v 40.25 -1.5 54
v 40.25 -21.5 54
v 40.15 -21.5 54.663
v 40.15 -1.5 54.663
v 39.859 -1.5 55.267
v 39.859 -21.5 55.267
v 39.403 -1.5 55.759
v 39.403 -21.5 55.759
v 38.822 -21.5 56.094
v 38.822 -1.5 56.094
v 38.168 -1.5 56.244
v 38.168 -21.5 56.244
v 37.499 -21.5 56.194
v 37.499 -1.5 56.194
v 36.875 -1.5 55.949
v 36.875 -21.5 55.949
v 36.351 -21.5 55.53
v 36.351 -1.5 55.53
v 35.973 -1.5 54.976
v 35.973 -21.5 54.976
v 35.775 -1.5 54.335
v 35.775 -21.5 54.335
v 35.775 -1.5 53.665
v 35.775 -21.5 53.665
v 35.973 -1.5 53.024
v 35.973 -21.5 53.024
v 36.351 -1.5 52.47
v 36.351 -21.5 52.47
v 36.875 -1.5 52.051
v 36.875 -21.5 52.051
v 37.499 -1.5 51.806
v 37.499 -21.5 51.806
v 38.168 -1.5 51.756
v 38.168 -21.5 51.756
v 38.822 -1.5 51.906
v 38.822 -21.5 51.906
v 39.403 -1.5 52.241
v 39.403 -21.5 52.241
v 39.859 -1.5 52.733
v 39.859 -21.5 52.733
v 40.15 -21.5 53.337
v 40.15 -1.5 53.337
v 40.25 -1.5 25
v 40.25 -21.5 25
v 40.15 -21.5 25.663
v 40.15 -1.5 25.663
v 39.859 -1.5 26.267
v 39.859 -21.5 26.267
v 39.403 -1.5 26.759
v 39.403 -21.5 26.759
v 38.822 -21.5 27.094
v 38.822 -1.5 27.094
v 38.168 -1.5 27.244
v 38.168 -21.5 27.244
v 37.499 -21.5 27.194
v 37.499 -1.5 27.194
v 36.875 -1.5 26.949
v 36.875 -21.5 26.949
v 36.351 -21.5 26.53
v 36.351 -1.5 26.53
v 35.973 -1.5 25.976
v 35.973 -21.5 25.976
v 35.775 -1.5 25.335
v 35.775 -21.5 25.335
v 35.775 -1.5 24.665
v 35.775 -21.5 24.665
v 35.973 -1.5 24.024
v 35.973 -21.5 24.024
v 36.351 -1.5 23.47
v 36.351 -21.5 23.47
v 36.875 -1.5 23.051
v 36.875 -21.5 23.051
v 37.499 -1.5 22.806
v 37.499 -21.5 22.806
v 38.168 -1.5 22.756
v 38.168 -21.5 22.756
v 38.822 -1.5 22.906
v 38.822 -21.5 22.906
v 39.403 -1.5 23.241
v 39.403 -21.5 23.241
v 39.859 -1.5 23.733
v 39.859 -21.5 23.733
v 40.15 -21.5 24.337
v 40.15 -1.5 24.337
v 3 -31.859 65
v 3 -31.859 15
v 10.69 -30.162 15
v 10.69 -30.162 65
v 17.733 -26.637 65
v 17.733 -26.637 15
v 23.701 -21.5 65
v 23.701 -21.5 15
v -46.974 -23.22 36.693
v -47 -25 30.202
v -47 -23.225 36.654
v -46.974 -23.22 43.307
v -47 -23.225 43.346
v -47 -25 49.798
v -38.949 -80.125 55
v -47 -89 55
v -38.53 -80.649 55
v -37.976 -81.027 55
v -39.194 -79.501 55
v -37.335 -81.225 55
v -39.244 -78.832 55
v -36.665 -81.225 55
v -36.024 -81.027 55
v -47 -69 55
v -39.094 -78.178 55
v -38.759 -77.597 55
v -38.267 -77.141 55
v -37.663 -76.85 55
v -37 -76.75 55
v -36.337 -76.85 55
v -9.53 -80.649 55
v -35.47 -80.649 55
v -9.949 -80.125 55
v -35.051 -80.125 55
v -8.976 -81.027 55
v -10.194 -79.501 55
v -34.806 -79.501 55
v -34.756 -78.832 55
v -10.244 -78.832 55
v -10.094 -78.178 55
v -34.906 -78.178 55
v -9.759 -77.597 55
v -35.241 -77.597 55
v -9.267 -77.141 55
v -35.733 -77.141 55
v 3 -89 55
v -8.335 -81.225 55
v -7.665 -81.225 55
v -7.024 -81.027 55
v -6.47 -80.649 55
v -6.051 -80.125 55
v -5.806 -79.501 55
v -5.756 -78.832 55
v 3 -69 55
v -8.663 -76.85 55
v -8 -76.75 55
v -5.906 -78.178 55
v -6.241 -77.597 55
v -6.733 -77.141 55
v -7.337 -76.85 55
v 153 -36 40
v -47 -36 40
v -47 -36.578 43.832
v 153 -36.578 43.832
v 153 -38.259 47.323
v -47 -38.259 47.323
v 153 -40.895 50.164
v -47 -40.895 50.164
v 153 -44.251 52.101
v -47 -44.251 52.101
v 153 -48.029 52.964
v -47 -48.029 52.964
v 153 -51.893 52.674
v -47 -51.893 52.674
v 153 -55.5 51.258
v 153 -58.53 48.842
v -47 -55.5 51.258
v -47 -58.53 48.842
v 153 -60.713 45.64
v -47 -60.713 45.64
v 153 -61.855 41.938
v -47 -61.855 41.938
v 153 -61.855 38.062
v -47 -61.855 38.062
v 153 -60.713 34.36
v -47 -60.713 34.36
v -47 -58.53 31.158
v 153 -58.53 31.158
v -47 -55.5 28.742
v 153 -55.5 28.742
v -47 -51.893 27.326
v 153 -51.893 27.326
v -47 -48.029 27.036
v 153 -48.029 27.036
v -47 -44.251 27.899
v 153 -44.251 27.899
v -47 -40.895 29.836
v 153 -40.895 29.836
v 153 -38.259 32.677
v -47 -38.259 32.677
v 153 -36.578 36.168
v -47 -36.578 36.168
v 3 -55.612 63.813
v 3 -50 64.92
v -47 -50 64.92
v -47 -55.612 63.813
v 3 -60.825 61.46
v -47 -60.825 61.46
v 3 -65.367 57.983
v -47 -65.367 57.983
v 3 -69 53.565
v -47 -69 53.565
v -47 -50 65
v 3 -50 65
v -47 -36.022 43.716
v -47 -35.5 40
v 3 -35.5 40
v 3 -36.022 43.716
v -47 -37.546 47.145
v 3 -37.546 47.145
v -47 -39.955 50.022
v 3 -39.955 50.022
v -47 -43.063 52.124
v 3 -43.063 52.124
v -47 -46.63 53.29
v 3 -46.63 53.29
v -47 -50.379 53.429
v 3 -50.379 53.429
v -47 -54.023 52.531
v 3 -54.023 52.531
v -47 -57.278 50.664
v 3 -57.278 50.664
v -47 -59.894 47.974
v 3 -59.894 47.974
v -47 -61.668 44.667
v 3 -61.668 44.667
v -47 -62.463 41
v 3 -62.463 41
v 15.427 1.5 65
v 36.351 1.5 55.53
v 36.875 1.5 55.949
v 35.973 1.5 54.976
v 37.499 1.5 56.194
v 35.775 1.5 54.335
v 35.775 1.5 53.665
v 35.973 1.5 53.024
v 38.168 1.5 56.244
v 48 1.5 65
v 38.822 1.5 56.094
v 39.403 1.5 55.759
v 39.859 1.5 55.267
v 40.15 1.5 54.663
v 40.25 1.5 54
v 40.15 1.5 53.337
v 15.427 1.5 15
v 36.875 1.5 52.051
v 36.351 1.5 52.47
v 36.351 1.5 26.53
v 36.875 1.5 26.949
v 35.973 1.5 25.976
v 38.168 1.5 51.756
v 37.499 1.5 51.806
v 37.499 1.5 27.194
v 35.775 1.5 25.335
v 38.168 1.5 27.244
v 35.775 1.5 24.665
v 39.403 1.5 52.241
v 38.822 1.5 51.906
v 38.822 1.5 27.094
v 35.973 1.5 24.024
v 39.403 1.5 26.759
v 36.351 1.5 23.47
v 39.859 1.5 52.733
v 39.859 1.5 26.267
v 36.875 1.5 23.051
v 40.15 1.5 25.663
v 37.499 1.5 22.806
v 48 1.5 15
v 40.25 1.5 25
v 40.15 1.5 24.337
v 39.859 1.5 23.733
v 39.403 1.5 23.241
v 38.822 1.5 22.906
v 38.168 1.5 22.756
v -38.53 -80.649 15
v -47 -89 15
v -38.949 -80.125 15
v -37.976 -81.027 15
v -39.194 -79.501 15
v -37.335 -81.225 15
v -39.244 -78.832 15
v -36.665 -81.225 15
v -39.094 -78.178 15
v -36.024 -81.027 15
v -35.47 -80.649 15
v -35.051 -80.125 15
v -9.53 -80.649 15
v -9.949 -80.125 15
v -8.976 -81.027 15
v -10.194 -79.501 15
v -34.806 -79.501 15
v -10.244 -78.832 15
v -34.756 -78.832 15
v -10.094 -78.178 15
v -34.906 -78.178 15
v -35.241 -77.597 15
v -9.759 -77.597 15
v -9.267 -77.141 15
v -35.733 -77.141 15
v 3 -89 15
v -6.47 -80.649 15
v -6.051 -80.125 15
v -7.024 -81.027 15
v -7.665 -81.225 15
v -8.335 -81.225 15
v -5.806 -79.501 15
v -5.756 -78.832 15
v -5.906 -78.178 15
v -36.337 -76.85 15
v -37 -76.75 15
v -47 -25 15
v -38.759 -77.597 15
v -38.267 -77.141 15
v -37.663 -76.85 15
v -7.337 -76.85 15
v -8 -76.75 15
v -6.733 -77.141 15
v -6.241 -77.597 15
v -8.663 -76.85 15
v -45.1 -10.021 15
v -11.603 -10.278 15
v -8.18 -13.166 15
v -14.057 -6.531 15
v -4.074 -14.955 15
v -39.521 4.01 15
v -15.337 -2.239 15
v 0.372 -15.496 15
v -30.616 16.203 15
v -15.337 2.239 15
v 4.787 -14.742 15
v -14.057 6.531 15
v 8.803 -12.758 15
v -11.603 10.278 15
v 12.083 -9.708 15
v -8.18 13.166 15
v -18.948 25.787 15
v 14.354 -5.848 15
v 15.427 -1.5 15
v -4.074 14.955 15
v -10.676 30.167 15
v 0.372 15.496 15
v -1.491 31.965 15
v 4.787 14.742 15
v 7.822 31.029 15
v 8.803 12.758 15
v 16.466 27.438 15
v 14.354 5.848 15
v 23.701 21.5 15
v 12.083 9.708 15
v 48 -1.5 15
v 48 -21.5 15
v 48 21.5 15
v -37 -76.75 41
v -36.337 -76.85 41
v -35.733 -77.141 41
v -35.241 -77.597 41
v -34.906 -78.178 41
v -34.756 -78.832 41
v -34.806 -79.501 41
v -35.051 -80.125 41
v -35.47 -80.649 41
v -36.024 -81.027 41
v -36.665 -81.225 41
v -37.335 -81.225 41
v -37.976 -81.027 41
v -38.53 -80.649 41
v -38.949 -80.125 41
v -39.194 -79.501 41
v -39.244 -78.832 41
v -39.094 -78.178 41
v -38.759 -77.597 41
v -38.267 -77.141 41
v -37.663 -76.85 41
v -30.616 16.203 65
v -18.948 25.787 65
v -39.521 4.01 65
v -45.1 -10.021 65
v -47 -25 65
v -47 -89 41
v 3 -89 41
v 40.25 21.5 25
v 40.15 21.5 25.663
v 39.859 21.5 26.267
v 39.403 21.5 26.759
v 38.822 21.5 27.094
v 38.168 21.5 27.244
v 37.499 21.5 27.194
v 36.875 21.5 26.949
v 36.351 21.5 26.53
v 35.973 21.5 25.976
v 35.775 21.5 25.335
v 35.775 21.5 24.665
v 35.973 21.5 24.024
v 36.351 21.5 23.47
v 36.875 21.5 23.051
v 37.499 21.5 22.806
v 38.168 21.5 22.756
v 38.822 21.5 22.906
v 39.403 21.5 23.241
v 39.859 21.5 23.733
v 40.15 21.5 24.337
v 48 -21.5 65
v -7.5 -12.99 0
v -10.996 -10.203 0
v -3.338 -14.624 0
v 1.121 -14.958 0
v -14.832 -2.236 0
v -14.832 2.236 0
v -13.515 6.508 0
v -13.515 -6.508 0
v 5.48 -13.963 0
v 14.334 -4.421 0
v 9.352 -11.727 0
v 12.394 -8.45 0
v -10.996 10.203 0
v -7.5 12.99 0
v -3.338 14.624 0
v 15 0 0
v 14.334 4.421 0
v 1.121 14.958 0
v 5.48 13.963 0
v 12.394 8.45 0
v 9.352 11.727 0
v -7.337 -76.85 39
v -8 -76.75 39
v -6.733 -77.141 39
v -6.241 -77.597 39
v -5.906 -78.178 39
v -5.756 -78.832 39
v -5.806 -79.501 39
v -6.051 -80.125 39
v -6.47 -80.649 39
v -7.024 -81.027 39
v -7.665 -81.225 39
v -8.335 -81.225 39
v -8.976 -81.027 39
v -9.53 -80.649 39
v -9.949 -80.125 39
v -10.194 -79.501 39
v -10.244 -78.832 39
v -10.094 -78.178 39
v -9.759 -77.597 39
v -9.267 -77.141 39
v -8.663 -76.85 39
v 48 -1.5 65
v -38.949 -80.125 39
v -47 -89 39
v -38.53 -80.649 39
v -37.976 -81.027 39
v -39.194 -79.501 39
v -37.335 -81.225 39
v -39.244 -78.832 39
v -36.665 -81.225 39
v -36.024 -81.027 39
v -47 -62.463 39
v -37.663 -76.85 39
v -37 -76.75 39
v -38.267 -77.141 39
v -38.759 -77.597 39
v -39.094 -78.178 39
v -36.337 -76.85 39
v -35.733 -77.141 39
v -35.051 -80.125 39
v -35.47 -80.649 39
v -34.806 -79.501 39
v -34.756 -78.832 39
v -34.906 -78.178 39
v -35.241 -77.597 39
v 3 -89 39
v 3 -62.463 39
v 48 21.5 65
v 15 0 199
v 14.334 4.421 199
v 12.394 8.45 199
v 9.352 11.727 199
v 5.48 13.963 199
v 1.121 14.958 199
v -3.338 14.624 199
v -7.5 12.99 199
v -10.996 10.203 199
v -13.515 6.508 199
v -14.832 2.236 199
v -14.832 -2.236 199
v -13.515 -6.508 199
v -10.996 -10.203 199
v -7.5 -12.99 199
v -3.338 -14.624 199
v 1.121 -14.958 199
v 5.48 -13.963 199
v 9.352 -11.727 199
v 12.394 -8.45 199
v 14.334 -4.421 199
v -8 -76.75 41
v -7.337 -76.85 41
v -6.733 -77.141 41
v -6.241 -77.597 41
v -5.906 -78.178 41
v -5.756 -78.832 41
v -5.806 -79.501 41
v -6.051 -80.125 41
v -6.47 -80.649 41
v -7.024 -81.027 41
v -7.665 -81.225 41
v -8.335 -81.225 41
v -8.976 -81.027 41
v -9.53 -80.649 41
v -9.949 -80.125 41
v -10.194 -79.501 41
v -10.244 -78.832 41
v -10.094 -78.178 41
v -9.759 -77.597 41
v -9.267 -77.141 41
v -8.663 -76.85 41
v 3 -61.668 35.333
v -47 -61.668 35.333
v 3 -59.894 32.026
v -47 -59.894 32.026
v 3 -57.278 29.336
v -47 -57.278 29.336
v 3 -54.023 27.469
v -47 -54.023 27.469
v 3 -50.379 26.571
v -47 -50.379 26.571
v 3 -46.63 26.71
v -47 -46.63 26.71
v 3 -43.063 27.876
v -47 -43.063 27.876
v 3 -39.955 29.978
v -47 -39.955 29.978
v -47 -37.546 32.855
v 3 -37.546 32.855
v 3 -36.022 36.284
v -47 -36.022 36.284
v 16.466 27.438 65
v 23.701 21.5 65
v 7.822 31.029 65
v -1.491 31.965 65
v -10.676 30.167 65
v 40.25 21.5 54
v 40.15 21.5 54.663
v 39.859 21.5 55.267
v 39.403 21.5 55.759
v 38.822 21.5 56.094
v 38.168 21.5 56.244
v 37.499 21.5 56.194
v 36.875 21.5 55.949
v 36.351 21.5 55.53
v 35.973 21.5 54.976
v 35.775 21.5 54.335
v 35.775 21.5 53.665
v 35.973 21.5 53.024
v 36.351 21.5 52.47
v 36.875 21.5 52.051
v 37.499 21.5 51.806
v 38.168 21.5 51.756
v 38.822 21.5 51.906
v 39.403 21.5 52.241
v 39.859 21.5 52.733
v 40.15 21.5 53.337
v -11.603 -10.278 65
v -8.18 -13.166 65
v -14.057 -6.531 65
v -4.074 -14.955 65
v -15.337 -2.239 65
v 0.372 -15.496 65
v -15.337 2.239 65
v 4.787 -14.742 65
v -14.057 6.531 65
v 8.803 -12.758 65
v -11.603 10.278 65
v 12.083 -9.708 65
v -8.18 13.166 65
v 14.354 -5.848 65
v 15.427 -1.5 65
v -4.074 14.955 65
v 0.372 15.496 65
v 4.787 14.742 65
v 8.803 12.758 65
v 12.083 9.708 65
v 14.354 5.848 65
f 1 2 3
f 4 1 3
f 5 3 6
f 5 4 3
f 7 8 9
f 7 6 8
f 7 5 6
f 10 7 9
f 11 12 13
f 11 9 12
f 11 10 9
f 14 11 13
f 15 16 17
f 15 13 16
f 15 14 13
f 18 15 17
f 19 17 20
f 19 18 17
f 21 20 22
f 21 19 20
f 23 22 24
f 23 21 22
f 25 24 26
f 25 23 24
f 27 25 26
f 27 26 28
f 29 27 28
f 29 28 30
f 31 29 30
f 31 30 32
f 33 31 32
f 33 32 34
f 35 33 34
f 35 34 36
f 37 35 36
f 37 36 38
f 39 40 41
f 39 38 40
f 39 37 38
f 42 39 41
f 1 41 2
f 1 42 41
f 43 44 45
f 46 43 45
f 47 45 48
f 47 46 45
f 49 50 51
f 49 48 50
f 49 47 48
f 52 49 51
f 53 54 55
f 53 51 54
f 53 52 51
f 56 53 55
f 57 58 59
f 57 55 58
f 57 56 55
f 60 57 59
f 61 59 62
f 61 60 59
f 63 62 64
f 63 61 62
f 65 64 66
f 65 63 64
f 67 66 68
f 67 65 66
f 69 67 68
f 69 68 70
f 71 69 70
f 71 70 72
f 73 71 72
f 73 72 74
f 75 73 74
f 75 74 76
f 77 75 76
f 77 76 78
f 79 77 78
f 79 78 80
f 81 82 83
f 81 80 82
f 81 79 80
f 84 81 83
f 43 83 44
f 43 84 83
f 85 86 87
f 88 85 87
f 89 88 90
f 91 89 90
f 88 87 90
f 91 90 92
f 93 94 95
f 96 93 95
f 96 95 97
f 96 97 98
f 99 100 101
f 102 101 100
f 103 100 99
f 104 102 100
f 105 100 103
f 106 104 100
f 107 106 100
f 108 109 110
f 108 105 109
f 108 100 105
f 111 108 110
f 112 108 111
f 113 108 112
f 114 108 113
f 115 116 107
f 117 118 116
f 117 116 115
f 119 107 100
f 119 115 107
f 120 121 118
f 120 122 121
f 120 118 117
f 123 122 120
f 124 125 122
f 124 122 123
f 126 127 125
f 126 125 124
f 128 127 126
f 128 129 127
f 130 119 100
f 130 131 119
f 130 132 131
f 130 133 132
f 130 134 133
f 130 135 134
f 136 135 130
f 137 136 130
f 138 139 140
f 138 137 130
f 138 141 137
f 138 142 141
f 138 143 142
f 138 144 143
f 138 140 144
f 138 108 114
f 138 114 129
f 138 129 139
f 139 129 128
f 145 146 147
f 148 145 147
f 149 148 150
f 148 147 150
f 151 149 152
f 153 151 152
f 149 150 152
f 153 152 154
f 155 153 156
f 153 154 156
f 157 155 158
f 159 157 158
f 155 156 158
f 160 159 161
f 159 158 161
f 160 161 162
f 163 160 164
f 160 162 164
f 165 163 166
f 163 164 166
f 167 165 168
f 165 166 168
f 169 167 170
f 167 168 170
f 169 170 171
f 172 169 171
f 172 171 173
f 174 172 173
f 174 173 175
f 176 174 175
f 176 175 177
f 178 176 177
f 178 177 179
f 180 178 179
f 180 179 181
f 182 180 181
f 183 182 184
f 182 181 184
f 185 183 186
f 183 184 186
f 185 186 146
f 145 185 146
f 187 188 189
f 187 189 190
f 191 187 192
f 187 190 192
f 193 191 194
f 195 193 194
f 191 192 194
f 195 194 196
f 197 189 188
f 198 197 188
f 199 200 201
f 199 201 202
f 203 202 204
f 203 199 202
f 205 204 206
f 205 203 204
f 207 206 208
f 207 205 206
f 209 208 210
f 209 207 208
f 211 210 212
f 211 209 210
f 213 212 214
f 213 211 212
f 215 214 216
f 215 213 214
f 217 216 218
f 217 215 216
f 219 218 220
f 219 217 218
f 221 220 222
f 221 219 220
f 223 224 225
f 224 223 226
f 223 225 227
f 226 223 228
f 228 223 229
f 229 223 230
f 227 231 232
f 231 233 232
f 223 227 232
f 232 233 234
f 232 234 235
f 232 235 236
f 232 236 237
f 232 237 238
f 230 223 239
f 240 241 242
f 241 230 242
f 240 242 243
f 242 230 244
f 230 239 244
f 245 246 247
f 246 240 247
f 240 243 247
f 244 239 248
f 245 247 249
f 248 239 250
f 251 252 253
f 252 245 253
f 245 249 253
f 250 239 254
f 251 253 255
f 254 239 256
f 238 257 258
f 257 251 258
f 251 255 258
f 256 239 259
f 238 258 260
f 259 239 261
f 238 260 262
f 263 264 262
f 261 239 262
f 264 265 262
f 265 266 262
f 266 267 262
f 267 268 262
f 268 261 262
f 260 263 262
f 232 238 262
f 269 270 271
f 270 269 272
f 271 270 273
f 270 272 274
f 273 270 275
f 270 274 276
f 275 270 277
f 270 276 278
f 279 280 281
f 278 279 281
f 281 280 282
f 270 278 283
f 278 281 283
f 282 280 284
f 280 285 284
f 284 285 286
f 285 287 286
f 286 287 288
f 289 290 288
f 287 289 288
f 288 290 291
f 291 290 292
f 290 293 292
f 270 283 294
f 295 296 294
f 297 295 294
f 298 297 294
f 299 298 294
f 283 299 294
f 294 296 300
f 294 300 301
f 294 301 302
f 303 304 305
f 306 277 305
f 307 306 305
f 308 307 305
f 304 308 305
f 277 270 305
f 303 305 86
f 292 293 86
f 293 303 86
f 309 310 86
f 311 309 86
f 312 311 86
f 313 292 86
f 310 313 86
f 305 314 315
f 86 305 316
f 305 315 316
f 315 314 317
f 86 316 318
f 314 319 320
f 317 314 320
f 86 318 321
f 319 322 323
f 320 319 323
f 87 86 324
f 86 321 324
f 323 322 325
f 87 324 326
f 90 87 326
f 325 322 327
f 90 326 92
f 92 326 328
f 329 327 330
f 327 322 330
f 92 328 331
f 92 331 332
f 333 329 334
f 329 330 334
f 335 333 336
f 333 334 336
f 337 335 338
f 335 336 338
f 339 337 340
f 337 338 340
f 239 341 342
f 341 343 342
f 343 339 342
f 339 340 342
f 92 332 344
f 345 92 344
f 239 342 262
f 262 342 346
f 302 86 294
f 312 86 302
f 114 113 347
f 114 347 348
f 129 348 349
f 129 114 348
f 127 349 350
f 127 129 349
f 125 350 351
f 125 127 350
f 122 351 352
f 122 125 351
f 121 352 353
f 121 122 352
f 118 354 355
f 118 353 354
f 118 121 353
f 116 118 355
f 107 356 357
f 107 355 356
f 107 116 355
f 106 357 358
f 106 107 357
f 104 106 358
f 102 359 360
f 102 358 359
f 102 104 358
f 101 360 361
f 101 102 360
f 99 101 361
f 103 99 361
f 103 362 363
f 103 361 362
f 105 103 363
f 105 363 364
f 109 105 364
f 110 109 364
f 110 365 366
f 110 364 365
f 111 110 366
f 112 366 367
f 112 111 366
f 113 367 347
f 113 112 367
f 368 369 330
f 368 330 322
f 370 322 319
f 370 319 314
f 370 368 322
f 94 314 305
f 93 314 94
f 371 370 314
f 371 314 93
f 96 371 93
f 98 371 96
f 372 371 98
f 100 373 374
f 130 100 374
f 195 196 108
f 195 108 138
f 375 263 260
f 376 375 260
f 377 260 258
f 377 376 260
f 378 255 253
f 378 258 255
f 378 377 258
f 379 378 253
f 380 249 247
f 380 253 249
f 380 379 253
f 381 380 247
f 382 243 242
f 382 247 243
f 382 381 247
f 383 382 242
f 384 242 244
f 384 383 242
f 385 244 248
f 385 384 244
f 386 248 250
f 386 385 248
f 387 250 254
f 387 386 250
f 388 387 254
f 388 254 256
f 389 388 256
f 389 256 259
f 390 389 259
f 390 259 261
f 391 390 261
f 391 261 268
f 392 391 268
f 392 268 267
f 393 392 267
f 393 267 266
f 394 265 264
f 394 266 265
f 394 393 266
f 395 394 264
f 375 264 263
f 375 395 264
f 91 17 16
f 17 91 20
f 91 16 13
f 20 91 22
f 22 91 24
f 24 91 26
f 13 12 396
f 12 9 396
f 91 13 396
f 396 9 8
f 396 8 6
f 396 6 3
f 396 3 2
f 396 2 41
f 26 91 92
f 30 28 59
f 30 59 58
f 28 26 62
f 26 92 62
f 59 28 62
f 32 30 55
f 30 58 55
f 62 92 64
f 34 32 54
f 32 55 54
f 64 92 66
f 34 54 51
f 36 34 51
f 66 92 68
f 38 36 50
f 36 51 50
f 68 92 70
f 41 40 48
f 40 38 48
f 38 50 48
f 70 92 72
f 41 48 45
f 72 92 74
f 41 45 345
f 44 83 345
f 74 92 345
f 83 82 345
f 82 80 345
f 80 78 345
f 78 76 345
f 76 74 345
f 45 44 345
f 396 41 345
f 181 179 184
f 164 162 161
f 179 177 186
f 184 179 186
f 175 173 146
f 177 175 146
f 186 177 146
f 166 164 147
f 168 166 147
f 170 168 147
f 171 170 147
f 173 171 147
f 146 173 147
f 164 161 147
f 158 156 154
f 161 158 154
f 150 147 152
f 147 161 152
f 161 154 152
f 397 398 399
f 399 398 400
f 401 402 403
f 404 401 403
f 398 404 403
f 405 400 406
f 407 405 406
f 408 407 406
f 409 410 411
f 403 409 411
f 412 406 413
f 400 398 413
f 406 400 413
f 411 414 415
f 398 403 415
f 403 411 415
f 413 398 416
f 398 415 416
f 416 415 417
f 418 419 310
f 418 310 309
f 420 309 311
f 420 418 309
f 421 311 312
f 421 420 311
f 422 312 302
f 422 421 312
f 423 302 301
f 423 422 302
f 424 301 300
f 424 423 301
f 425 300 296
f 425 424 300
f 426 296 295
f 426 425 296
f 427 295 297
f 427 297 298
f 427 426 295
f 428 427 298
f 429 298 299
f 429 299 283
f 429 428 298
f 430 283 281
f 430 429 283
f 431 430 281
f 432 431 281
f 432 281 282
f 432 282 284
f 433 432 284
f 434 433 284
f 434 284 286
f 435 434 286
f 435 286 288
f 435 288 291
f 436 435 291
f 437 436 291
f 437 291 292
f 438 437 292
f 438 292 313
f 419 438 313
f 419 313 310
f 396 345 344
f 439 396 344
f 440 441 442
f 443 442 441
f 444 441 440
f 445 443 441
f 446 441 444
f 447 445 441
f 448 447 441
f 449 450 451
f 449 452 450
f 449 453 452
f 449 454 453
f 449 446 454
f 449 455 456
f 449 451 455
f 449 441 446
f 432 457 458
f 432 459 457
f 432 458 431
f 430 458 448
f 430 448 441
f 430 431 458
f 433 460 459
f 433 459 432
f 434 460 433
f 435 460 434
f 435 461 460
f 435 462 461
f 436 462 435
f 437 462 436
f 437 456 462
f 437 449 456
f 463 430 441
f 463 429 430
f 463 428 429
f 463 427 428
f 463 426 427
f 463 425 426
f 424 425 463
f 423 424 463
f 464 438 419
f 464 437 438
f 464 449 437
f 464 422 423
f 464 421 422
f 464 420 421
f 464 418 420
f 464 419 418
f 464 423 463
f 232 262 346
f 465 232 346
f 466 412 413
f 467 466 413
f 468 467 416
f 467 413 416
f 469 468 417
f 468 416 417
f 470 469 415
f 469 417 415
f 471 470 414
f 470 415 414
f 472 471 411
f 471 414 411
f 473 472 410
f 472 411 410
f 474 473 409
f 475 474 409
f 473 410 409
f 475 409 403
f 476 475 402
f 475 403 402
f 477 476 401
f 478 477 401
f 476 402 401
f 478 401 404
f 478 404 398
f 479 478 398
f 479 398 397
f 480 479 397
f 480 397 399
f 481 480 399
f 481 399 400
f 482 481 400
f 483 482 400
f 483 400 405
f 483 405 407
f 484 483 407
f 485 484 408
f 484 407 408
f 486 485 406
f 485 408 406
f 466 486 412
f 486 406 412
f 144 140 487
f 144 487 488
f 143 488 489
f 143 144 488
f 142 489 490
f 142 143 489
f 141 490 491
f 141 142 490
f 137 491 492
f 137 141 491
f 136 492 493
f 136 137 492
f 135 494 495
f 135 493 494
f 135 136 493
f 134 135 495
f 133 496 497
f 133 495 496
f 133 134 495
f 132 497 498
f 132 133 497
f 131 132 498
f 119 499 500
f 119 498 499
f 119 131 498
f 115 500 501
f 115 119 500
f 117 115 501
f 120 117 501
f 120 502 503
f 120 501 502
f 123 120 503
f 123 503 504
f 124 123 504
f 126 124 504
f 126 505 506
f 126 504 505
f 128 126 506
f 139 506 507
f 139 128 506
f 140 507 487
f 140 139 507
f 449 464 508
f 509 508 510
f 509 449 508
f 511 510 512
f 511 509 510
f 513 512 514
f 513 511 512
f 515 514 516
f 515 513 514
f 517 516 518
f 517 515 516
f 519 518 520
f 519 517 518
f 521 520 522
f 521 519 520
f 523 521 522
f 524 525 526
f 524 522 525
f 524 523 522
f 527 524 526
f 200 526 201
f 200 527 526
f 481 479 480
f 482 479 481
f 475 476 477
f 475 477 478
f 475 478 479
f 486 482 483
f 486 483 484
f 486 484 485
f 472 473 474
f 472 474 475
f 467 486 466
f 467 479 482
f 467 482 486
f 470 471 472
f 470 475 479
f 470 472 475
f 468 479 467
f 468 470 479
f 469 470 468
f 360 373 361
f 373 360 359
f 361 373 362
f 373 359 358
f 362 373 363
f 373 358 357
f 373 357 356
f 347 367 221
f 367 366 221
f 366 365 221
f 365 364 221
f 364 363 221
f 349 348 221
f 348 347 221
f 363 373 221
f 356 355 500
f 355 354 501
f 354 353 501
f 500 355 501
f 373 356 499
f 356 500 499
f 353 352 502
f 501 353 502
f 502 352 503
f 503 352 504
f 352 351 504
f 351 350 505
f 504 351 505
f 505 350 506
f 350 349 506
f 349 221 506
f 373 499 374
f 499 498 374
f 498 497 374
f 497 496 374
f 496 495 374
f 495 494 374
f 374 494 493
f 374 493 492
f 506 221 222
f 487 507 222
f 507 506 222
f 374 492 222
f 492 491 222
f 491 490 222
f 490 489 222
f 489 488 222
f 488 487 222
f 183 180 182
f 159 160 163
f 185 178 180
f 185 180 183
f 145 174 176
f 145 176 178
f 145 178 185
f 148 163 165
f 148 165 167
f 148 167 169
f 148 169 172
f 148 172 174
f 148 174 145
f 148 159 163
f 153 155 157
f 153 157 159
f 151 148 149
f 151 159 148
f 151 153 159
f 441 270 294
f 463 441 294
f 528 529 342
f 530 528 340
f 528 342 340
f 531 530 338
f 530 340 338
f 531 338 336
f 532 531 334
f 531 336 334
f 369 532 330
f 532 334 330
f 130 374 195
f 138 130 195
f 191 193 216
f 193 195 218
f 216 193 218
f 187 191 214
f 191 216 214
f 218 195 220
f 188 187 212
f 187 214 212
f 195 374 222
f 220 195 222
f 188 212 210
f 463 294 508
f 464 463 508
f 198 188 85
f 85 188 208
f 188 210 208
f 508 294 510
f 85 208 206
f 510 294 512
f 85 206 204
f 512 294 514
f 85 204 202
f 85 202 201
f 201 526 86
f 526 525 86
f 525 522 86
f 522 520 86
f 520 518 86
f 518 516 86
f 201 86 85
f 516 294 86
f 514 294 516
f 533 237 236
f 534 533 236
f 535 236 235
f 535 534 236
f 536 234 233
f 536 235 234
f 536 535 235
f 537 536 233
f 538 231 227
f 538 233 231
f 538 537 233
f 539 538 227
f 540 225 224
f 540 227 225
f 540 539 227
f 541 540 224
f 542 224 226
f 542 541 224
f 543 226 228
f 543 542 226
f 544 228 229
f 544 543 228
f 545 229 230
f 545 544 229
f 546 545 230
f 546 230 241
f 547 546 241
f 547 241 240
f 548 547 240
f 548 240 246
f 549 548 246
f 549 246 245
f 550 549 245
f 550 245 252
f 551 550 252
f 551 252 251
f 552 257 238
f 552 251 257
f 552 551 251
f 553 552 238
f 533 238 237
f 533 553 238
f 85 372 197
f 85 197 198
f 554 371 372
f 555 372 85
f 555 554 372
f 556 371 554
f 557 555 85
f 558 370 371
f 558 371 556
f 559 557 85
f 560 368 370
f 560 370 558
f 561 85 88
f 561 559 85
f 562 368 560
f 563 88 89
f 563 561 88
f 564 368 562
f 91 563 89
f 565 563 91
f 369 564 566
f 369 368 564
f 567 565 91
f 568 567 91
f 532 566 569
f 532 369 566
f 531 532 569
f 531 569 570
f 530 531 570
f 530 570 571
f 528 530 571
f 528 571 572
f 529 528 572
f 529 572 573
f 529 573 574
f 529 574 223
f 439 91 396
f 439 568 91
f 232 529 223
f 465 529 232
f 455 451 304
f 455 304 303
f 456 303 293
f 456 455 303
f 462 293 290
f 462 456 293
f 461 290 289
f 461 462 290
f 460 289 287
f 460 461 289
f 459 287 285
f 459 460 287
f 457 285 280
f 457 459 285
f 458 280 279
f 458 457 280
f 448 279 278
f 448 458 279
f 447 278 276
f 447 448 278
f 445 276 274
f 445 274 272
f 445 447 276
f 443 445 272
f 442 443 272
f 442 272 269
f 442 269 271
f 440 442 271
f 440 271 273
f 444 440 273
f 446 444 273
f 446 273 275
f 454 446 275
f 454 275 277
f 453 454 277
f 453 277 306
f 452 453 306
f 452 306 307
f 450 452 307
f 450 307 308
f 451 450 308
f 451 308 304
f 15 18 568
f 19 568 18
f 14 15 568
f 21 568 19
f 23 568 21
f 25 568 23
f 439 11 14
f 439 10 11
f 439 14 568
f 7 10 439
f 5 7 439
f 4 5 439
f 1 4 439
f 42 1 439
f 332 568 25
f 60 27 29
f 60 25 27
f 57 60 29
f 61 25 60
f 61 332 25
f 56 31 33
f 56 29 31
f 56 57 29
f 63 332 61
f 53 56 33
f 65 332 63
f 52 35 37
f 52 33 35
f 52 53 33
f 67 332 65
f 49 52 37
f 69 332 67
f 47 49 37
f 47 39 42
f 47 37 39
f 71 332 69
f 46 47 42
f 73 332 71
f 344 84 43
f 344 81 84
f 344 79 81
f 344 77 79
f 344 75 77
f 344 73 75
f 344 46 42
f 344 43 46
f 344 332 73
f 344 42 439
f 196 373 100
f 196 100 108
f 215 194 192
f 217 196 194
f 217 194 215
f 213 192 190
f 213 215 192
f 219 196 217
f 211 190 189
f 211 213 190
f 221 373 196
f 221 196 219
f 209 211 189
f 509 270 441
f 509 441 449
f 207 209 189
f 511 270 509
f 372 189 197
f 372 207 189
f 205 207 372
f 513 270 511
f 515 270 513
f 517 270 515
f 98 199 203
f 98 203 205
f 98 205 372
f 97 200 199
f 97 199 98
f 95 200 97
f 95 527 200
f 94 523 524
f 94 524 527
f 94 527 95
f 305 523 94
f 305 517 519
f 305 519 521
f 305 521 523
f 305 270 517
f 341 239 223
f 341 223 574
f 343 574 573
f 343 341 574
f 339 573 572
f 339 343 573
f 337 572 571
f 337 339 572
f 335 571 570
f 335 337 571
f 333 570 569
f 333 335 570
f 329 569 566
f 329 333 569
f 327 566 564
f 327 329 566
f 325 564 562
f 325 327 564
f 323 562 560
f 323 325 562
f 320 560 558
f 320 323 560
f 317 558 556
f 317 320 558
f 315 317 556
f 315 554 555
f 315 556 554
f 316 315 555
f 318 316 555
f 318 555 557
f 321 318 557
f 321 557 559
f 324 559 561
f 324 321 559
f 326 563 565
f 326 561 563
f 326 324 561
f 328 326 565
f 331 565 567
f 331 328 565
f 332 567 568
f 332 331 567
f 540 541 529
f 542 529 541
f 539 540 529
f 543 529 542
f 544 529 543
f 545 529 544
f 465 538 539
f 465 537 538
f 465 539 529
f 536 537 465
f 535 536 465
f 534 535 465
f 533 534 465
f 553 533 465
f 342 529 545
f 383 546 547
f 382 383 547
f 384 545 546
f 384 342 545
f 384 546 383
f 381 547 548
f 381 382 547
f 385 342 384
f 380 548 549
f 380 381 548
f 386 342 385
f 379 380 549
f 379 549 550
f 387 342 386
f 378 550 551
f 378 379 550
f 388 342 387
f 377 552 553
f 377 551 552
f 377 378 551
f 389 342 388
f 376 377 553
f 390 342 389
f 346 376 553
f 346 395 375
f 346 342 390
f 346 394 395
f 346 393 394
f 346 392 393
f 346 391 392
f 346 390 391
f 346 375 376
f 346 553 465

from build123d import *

# Parameters (mm, degrees)
CYLINDER_R                  = 15
CYLINDER_DEPTH              = 199
CYLINDER001_R               = 13
CYLINDER001_DEPTH           = 200
CYLINDER005_R               = 2.25
CYLINDER005_DEPTH           = 50
CYLINDER006_R               = 2.25
CYLINDER006_DEPTH           = 50
FUSION_ROLL_ANGLE           = 90
FUSION_PLACEMENT_ANGLE      = 90
CYLINDER007_R               = 2.25
CYLINDER007_DEPTH           = 50
CYLINDER008_R               = 2.25
CYLINDER008_DEPTH           = 50
CYLINDER004_R               = 15.5
CYLINDER004_DEPTH           = 199
CYLINDER003_R               = 13.5
CYLINDER003_DEPTH           = 200
BOX006_W                    = 50
BOX006_H                    = 27
BOX006_DEPTH                = 2
BOX_W                       = 20
BOX_H                       = 3
BOX_DEPTH                   = 50
CYLINDER002_W               = 60
CYLINDER002_H               = 50
CYLINDER002_ANGLE           = 60
CYLINDER002_PLACEMENT_ANGLE = 120
BOX005_W                    = 50
BOX005_H                    = 20
BOX005_DEPTH                = 14
BOX004_W                    = 50
BOX004_H                    = 25
BOX004_DEPTH                = 14
BOX003_W                    = 50
BOX003_H                    = 63
BOX003_DEPTH                = 10
BOX002_W                    = 25
BOX002_H                    = 20
BOX002_DEPTH                = 50
BOX001_W                    = 25
BOX001_H                    = 20
BOX001_DEPTH                = 50
TUBE001_R                   = 25
TUBE001_R_2                 = 13.5
TUBE001_DEPTH               = 50
TUBE_R                      = 32
TUBE_R_2                    = 15.5
TUBE_DEPTH                  = 50
BOX007_W                    = 50
BOX007_H                    = 25
BOX007_DEPTH                = 50


with BuildPart() as horizontal:
    # Cylinder → Cylinder (new body)
    with BuildSketch(Plane.XY):
        Circle(CYLINDER_R)
    extrude(amount=CYLINDER_DEPTH)


with BuildPart() as vertical:
    # Cylinder001 → Cylinder001 (new body)
    with BuildSketch(Plane(origin=(-47, -49, 40), x_dir=(0, 1, 0), z_dir=(1, 0, 0))):
        Circle(CYLINDER001_R)
    extrude(amount=CYLINDER001_DEPTH)


with BuildPart() as m4s:
    # Cylinder005 → Cylinder005 (new body)
    with BuildSketch(Plane(origin=(38, 22, 25), x_dir=(1, 0, 0), z_dir=(0, -1, 0))):
        Circle(CYLINDER005_R)
    extrude(amount=CYLINDER005_DEPTH)


with BuildPart() as m4s002:
    # Cylinder006 → Cylinder006 (new body)
    with BuildSketch(Plane(origin=(38, 22, 54), x_dir=(1, 0, 0), z_dir=(0, -1, 0))):
        Circle(CYLINDER006_R)
    extrude(amount=CYLINDER006_DEPTH)

    # Fusion: union m4s
    add(m4s.part)


with BuildPart() as m4s002_1:
    # Fusion roll: moved
    add(m4s002.part.rotate(Axis((0, 0, 0), (1, 0, 0)), FUSION_ROLL_ANGLE))


with BuildPart() as m4s002_2:
    # Fusion placement: moved
    add(m4s002_1.part.moved(Location((-62, -117, 43))).rotate(Axis((-62, -117, 43), (0, 0, 1)), FUSION_PLACEMENT_ANGLE))


with BuildPart() as m4s004:
    # Cylinder007 → Cylinder007 (new body)
    with BuildSketch(Plane(origin=(38, 22, 25), x_dir=(1, 0, 0), z_dir=(0, -1, 0))):
        Circle(CYLINDER007_R)
    extrude(amount=CYLINDER007_DEPTH)


with BuildPart() as m4s003:
    # Cylinder008 → Cylinder008 (new body)
    with BuildSketch(Plane(origin=(38, 22, 54), x_dir=(1, 0, 0), z_dir=(0, -1, 0))):
        Circle(CYLINDER008_R)
    extrude(amount=CYLINDER008_DEPTH)

    # Fusion001: union m4s004
    add(m4s004.part)


with BuildPart() as horizontal001cuts:
    # Cylinder004 → Cylinder004 (new body)
    with BuildSketch(Plane.XY):
        Circle(CYLINDER004_R)
    extrude(amount=CYLINDER004_DEPTH)


with BuildPart() as vertical001cuts:
    # Cylinder003 → Cylinder003 (new body)
    with BuildSketch(Plane(origin=(-47, -49, 40), x_dir=(0, 1, 0), z_dir=(1, 0, 0))):
        Circle(CYLINDER003_R)
    extrude(amount=CYLINDER003_DEPTH)


with BuildPart() as vercuts:
    # Box006 → Box006 (new body)
    with BuildSketch(Plane(origin=(-47, -89, 39), x_dir=(1, 0, 0), z_dir=(0, 0, 1))):
        with Locations((25, 13.5)):
            Rectangle(BOX006_W, BOX006_H)
    extrude(amount=BOX006_DEPTH)


with BuildPart() as cuts:
    # Box → Box (new body)
    with BuildSketch(Plane(origin=(14, -1.5, 15), x_dir=(1, 0, 0), z_dir=(0, 0, 1))):
        with Locations((10, 1.5)):
            Rectangle(BOX_W, BOX_H)
    extrude(amount=BOX_DEPTH)

    # Fusion002: union m4s002, m4s003, Horizontal001Cuts, Vertical001Cuts, verCuts
    add(m4s002_2.part)
    add(m4s003.part)
    add(horizontal001cuts.part)
    add(vertical001cuts.part)
    add(vercuts.part)


with BuildPart() as addcylinder:
    # Cylinder002 → Cylinder002 (revolve)
    with BuildSketch(Plane.XZ):
        with Locations((30, 25)):
            Rectangle(CYLINDER002_W, CYLINDER002_H)
    revolve(axis=Axis((0, 0, 0), (0, 0, 1)), revolution_arc=CYLINDER002_ANGLE)


with BuildPart() as addcylinder_1:
    # Cylinder002 placement: moved
    add(addcylinder.part.moved(Location((13, -25, 15))).rotate(Axis((13, -25, 15), (0, 0, 1)), CYLINDER002_PLACEMENT_ANGLE))


with BuildPart() as veraddons002:
    # Box005 → Box005 (new body)
    with BuildSketch(Plane(origin=(-47, -89, 41), x_dir=(1, 0, 0), z_dir=(0, 0, 1))):
        with Locations((25, 10)):
            Rectangle(BOX005_W, BOX005_H)
    extrude(amount=BOX005_DEPTH)


with BuildPart() as veraddons001:
    # Box004 → Box004 (new body)
    with BuildSketch(Plane(origin=(-47, -89, 25), x_dir=(1, 0, 0), z_dir=(0, 0, 1))):
        with Locations((25, 12.5)):
            Rectangle(BOX004_W, BOX004_H)
    extrude(amount=BOX004_DEPTH)


with BuildPart() as veraddons:
    # Box003 → Box003 (new body)
    with BuildSketch(Plane(origin=(-47, -89, 15), x_dir=(1, 0, 0), z_dir=(0, 0, 1))):
        with Locations((25, 31.5)):
            Rectangle(BOX003_W, BOX003_H)
    extrude(amount=BOX003_DEPTH)


with BuildPart() as horadd001:
    # Box002 → Box002 (new body)
    with BuildSketch(Plane(origin=(23, 1.5, 15), x_dir=(1, 0, 0), z_dir=(0, 0, 1))):
        with Locations((12.5, 10)):
            Rectangle(BOX002_W, BOX002_H)
    extrude(amount=BOX002_DEPTH)


with BuildPart() as horadd:
    # Box001 → Box001 (new body)
    with BuildSketch(Plane(origin=(23, -21.5, 15), x_dir=(1, 0, 0), z_dir=(0, 0, 1))):
        with Locations((12.5, 10)):
            Rectangle(BOX001_W, BOX001_H)
    extrude(amount=BOX001_DEPTH)


with BuildPart() as tubeaddons001:
    # Tube001 → Tube001 (new body)
    with BuildSketch(Plane(origin=(-47, -48, 40), x_dir=(0, 0, -1), z_dir=(1, 0, 0))):
        Circle(TUBE001_R)
        Circle(TUBE001_R_2, mode=Mode.SUBTRACT)
    extrude(amount=TUBE001_DEPTH)


with BuildPart() as tubeaddons:
    # Tube → Tube (new body)
    with BuildSketch(Plane.XY.offset(15)):
        Circle(TUBE_R)
        Circle(TUBE_R_2, mode=Mode.SUBTRACT)
    extrude(amount=TUBE_DEPTH)


with BuildPart() as left:
    # Box007 → Box007 (new body)
    with BuildSketch(Plane(origin=(-47, -50, 15), x_dir=(1, 0, 0), z_dir=(0, 0, 1))):
        with Locations((25, 12.5)):
            Rectangle(BOX007_W, BOX007_H)
    extrude(amount=BOX007_DEPTH)

    # Fusion003: union AddCylinder, VerAddons002, VerAddons001, VerAddons, horAdd001, horAdd, TubeAddons001, TubeAddons
    add(addcylinder_1.part)
    add(veraddons002.part)
    add(veraddons001.part)
    add(veraddons.part)
    add(horadd001.part)
    add(horadd.part)
    add(tubeaddons001.part)
    add(tubeaddons.part)

    # Cut: cut cuts
    add(cuts.part, mode=Mode.SUBTRACT)


solid = Compound([horizontal.part, vertical.part, left.part])
